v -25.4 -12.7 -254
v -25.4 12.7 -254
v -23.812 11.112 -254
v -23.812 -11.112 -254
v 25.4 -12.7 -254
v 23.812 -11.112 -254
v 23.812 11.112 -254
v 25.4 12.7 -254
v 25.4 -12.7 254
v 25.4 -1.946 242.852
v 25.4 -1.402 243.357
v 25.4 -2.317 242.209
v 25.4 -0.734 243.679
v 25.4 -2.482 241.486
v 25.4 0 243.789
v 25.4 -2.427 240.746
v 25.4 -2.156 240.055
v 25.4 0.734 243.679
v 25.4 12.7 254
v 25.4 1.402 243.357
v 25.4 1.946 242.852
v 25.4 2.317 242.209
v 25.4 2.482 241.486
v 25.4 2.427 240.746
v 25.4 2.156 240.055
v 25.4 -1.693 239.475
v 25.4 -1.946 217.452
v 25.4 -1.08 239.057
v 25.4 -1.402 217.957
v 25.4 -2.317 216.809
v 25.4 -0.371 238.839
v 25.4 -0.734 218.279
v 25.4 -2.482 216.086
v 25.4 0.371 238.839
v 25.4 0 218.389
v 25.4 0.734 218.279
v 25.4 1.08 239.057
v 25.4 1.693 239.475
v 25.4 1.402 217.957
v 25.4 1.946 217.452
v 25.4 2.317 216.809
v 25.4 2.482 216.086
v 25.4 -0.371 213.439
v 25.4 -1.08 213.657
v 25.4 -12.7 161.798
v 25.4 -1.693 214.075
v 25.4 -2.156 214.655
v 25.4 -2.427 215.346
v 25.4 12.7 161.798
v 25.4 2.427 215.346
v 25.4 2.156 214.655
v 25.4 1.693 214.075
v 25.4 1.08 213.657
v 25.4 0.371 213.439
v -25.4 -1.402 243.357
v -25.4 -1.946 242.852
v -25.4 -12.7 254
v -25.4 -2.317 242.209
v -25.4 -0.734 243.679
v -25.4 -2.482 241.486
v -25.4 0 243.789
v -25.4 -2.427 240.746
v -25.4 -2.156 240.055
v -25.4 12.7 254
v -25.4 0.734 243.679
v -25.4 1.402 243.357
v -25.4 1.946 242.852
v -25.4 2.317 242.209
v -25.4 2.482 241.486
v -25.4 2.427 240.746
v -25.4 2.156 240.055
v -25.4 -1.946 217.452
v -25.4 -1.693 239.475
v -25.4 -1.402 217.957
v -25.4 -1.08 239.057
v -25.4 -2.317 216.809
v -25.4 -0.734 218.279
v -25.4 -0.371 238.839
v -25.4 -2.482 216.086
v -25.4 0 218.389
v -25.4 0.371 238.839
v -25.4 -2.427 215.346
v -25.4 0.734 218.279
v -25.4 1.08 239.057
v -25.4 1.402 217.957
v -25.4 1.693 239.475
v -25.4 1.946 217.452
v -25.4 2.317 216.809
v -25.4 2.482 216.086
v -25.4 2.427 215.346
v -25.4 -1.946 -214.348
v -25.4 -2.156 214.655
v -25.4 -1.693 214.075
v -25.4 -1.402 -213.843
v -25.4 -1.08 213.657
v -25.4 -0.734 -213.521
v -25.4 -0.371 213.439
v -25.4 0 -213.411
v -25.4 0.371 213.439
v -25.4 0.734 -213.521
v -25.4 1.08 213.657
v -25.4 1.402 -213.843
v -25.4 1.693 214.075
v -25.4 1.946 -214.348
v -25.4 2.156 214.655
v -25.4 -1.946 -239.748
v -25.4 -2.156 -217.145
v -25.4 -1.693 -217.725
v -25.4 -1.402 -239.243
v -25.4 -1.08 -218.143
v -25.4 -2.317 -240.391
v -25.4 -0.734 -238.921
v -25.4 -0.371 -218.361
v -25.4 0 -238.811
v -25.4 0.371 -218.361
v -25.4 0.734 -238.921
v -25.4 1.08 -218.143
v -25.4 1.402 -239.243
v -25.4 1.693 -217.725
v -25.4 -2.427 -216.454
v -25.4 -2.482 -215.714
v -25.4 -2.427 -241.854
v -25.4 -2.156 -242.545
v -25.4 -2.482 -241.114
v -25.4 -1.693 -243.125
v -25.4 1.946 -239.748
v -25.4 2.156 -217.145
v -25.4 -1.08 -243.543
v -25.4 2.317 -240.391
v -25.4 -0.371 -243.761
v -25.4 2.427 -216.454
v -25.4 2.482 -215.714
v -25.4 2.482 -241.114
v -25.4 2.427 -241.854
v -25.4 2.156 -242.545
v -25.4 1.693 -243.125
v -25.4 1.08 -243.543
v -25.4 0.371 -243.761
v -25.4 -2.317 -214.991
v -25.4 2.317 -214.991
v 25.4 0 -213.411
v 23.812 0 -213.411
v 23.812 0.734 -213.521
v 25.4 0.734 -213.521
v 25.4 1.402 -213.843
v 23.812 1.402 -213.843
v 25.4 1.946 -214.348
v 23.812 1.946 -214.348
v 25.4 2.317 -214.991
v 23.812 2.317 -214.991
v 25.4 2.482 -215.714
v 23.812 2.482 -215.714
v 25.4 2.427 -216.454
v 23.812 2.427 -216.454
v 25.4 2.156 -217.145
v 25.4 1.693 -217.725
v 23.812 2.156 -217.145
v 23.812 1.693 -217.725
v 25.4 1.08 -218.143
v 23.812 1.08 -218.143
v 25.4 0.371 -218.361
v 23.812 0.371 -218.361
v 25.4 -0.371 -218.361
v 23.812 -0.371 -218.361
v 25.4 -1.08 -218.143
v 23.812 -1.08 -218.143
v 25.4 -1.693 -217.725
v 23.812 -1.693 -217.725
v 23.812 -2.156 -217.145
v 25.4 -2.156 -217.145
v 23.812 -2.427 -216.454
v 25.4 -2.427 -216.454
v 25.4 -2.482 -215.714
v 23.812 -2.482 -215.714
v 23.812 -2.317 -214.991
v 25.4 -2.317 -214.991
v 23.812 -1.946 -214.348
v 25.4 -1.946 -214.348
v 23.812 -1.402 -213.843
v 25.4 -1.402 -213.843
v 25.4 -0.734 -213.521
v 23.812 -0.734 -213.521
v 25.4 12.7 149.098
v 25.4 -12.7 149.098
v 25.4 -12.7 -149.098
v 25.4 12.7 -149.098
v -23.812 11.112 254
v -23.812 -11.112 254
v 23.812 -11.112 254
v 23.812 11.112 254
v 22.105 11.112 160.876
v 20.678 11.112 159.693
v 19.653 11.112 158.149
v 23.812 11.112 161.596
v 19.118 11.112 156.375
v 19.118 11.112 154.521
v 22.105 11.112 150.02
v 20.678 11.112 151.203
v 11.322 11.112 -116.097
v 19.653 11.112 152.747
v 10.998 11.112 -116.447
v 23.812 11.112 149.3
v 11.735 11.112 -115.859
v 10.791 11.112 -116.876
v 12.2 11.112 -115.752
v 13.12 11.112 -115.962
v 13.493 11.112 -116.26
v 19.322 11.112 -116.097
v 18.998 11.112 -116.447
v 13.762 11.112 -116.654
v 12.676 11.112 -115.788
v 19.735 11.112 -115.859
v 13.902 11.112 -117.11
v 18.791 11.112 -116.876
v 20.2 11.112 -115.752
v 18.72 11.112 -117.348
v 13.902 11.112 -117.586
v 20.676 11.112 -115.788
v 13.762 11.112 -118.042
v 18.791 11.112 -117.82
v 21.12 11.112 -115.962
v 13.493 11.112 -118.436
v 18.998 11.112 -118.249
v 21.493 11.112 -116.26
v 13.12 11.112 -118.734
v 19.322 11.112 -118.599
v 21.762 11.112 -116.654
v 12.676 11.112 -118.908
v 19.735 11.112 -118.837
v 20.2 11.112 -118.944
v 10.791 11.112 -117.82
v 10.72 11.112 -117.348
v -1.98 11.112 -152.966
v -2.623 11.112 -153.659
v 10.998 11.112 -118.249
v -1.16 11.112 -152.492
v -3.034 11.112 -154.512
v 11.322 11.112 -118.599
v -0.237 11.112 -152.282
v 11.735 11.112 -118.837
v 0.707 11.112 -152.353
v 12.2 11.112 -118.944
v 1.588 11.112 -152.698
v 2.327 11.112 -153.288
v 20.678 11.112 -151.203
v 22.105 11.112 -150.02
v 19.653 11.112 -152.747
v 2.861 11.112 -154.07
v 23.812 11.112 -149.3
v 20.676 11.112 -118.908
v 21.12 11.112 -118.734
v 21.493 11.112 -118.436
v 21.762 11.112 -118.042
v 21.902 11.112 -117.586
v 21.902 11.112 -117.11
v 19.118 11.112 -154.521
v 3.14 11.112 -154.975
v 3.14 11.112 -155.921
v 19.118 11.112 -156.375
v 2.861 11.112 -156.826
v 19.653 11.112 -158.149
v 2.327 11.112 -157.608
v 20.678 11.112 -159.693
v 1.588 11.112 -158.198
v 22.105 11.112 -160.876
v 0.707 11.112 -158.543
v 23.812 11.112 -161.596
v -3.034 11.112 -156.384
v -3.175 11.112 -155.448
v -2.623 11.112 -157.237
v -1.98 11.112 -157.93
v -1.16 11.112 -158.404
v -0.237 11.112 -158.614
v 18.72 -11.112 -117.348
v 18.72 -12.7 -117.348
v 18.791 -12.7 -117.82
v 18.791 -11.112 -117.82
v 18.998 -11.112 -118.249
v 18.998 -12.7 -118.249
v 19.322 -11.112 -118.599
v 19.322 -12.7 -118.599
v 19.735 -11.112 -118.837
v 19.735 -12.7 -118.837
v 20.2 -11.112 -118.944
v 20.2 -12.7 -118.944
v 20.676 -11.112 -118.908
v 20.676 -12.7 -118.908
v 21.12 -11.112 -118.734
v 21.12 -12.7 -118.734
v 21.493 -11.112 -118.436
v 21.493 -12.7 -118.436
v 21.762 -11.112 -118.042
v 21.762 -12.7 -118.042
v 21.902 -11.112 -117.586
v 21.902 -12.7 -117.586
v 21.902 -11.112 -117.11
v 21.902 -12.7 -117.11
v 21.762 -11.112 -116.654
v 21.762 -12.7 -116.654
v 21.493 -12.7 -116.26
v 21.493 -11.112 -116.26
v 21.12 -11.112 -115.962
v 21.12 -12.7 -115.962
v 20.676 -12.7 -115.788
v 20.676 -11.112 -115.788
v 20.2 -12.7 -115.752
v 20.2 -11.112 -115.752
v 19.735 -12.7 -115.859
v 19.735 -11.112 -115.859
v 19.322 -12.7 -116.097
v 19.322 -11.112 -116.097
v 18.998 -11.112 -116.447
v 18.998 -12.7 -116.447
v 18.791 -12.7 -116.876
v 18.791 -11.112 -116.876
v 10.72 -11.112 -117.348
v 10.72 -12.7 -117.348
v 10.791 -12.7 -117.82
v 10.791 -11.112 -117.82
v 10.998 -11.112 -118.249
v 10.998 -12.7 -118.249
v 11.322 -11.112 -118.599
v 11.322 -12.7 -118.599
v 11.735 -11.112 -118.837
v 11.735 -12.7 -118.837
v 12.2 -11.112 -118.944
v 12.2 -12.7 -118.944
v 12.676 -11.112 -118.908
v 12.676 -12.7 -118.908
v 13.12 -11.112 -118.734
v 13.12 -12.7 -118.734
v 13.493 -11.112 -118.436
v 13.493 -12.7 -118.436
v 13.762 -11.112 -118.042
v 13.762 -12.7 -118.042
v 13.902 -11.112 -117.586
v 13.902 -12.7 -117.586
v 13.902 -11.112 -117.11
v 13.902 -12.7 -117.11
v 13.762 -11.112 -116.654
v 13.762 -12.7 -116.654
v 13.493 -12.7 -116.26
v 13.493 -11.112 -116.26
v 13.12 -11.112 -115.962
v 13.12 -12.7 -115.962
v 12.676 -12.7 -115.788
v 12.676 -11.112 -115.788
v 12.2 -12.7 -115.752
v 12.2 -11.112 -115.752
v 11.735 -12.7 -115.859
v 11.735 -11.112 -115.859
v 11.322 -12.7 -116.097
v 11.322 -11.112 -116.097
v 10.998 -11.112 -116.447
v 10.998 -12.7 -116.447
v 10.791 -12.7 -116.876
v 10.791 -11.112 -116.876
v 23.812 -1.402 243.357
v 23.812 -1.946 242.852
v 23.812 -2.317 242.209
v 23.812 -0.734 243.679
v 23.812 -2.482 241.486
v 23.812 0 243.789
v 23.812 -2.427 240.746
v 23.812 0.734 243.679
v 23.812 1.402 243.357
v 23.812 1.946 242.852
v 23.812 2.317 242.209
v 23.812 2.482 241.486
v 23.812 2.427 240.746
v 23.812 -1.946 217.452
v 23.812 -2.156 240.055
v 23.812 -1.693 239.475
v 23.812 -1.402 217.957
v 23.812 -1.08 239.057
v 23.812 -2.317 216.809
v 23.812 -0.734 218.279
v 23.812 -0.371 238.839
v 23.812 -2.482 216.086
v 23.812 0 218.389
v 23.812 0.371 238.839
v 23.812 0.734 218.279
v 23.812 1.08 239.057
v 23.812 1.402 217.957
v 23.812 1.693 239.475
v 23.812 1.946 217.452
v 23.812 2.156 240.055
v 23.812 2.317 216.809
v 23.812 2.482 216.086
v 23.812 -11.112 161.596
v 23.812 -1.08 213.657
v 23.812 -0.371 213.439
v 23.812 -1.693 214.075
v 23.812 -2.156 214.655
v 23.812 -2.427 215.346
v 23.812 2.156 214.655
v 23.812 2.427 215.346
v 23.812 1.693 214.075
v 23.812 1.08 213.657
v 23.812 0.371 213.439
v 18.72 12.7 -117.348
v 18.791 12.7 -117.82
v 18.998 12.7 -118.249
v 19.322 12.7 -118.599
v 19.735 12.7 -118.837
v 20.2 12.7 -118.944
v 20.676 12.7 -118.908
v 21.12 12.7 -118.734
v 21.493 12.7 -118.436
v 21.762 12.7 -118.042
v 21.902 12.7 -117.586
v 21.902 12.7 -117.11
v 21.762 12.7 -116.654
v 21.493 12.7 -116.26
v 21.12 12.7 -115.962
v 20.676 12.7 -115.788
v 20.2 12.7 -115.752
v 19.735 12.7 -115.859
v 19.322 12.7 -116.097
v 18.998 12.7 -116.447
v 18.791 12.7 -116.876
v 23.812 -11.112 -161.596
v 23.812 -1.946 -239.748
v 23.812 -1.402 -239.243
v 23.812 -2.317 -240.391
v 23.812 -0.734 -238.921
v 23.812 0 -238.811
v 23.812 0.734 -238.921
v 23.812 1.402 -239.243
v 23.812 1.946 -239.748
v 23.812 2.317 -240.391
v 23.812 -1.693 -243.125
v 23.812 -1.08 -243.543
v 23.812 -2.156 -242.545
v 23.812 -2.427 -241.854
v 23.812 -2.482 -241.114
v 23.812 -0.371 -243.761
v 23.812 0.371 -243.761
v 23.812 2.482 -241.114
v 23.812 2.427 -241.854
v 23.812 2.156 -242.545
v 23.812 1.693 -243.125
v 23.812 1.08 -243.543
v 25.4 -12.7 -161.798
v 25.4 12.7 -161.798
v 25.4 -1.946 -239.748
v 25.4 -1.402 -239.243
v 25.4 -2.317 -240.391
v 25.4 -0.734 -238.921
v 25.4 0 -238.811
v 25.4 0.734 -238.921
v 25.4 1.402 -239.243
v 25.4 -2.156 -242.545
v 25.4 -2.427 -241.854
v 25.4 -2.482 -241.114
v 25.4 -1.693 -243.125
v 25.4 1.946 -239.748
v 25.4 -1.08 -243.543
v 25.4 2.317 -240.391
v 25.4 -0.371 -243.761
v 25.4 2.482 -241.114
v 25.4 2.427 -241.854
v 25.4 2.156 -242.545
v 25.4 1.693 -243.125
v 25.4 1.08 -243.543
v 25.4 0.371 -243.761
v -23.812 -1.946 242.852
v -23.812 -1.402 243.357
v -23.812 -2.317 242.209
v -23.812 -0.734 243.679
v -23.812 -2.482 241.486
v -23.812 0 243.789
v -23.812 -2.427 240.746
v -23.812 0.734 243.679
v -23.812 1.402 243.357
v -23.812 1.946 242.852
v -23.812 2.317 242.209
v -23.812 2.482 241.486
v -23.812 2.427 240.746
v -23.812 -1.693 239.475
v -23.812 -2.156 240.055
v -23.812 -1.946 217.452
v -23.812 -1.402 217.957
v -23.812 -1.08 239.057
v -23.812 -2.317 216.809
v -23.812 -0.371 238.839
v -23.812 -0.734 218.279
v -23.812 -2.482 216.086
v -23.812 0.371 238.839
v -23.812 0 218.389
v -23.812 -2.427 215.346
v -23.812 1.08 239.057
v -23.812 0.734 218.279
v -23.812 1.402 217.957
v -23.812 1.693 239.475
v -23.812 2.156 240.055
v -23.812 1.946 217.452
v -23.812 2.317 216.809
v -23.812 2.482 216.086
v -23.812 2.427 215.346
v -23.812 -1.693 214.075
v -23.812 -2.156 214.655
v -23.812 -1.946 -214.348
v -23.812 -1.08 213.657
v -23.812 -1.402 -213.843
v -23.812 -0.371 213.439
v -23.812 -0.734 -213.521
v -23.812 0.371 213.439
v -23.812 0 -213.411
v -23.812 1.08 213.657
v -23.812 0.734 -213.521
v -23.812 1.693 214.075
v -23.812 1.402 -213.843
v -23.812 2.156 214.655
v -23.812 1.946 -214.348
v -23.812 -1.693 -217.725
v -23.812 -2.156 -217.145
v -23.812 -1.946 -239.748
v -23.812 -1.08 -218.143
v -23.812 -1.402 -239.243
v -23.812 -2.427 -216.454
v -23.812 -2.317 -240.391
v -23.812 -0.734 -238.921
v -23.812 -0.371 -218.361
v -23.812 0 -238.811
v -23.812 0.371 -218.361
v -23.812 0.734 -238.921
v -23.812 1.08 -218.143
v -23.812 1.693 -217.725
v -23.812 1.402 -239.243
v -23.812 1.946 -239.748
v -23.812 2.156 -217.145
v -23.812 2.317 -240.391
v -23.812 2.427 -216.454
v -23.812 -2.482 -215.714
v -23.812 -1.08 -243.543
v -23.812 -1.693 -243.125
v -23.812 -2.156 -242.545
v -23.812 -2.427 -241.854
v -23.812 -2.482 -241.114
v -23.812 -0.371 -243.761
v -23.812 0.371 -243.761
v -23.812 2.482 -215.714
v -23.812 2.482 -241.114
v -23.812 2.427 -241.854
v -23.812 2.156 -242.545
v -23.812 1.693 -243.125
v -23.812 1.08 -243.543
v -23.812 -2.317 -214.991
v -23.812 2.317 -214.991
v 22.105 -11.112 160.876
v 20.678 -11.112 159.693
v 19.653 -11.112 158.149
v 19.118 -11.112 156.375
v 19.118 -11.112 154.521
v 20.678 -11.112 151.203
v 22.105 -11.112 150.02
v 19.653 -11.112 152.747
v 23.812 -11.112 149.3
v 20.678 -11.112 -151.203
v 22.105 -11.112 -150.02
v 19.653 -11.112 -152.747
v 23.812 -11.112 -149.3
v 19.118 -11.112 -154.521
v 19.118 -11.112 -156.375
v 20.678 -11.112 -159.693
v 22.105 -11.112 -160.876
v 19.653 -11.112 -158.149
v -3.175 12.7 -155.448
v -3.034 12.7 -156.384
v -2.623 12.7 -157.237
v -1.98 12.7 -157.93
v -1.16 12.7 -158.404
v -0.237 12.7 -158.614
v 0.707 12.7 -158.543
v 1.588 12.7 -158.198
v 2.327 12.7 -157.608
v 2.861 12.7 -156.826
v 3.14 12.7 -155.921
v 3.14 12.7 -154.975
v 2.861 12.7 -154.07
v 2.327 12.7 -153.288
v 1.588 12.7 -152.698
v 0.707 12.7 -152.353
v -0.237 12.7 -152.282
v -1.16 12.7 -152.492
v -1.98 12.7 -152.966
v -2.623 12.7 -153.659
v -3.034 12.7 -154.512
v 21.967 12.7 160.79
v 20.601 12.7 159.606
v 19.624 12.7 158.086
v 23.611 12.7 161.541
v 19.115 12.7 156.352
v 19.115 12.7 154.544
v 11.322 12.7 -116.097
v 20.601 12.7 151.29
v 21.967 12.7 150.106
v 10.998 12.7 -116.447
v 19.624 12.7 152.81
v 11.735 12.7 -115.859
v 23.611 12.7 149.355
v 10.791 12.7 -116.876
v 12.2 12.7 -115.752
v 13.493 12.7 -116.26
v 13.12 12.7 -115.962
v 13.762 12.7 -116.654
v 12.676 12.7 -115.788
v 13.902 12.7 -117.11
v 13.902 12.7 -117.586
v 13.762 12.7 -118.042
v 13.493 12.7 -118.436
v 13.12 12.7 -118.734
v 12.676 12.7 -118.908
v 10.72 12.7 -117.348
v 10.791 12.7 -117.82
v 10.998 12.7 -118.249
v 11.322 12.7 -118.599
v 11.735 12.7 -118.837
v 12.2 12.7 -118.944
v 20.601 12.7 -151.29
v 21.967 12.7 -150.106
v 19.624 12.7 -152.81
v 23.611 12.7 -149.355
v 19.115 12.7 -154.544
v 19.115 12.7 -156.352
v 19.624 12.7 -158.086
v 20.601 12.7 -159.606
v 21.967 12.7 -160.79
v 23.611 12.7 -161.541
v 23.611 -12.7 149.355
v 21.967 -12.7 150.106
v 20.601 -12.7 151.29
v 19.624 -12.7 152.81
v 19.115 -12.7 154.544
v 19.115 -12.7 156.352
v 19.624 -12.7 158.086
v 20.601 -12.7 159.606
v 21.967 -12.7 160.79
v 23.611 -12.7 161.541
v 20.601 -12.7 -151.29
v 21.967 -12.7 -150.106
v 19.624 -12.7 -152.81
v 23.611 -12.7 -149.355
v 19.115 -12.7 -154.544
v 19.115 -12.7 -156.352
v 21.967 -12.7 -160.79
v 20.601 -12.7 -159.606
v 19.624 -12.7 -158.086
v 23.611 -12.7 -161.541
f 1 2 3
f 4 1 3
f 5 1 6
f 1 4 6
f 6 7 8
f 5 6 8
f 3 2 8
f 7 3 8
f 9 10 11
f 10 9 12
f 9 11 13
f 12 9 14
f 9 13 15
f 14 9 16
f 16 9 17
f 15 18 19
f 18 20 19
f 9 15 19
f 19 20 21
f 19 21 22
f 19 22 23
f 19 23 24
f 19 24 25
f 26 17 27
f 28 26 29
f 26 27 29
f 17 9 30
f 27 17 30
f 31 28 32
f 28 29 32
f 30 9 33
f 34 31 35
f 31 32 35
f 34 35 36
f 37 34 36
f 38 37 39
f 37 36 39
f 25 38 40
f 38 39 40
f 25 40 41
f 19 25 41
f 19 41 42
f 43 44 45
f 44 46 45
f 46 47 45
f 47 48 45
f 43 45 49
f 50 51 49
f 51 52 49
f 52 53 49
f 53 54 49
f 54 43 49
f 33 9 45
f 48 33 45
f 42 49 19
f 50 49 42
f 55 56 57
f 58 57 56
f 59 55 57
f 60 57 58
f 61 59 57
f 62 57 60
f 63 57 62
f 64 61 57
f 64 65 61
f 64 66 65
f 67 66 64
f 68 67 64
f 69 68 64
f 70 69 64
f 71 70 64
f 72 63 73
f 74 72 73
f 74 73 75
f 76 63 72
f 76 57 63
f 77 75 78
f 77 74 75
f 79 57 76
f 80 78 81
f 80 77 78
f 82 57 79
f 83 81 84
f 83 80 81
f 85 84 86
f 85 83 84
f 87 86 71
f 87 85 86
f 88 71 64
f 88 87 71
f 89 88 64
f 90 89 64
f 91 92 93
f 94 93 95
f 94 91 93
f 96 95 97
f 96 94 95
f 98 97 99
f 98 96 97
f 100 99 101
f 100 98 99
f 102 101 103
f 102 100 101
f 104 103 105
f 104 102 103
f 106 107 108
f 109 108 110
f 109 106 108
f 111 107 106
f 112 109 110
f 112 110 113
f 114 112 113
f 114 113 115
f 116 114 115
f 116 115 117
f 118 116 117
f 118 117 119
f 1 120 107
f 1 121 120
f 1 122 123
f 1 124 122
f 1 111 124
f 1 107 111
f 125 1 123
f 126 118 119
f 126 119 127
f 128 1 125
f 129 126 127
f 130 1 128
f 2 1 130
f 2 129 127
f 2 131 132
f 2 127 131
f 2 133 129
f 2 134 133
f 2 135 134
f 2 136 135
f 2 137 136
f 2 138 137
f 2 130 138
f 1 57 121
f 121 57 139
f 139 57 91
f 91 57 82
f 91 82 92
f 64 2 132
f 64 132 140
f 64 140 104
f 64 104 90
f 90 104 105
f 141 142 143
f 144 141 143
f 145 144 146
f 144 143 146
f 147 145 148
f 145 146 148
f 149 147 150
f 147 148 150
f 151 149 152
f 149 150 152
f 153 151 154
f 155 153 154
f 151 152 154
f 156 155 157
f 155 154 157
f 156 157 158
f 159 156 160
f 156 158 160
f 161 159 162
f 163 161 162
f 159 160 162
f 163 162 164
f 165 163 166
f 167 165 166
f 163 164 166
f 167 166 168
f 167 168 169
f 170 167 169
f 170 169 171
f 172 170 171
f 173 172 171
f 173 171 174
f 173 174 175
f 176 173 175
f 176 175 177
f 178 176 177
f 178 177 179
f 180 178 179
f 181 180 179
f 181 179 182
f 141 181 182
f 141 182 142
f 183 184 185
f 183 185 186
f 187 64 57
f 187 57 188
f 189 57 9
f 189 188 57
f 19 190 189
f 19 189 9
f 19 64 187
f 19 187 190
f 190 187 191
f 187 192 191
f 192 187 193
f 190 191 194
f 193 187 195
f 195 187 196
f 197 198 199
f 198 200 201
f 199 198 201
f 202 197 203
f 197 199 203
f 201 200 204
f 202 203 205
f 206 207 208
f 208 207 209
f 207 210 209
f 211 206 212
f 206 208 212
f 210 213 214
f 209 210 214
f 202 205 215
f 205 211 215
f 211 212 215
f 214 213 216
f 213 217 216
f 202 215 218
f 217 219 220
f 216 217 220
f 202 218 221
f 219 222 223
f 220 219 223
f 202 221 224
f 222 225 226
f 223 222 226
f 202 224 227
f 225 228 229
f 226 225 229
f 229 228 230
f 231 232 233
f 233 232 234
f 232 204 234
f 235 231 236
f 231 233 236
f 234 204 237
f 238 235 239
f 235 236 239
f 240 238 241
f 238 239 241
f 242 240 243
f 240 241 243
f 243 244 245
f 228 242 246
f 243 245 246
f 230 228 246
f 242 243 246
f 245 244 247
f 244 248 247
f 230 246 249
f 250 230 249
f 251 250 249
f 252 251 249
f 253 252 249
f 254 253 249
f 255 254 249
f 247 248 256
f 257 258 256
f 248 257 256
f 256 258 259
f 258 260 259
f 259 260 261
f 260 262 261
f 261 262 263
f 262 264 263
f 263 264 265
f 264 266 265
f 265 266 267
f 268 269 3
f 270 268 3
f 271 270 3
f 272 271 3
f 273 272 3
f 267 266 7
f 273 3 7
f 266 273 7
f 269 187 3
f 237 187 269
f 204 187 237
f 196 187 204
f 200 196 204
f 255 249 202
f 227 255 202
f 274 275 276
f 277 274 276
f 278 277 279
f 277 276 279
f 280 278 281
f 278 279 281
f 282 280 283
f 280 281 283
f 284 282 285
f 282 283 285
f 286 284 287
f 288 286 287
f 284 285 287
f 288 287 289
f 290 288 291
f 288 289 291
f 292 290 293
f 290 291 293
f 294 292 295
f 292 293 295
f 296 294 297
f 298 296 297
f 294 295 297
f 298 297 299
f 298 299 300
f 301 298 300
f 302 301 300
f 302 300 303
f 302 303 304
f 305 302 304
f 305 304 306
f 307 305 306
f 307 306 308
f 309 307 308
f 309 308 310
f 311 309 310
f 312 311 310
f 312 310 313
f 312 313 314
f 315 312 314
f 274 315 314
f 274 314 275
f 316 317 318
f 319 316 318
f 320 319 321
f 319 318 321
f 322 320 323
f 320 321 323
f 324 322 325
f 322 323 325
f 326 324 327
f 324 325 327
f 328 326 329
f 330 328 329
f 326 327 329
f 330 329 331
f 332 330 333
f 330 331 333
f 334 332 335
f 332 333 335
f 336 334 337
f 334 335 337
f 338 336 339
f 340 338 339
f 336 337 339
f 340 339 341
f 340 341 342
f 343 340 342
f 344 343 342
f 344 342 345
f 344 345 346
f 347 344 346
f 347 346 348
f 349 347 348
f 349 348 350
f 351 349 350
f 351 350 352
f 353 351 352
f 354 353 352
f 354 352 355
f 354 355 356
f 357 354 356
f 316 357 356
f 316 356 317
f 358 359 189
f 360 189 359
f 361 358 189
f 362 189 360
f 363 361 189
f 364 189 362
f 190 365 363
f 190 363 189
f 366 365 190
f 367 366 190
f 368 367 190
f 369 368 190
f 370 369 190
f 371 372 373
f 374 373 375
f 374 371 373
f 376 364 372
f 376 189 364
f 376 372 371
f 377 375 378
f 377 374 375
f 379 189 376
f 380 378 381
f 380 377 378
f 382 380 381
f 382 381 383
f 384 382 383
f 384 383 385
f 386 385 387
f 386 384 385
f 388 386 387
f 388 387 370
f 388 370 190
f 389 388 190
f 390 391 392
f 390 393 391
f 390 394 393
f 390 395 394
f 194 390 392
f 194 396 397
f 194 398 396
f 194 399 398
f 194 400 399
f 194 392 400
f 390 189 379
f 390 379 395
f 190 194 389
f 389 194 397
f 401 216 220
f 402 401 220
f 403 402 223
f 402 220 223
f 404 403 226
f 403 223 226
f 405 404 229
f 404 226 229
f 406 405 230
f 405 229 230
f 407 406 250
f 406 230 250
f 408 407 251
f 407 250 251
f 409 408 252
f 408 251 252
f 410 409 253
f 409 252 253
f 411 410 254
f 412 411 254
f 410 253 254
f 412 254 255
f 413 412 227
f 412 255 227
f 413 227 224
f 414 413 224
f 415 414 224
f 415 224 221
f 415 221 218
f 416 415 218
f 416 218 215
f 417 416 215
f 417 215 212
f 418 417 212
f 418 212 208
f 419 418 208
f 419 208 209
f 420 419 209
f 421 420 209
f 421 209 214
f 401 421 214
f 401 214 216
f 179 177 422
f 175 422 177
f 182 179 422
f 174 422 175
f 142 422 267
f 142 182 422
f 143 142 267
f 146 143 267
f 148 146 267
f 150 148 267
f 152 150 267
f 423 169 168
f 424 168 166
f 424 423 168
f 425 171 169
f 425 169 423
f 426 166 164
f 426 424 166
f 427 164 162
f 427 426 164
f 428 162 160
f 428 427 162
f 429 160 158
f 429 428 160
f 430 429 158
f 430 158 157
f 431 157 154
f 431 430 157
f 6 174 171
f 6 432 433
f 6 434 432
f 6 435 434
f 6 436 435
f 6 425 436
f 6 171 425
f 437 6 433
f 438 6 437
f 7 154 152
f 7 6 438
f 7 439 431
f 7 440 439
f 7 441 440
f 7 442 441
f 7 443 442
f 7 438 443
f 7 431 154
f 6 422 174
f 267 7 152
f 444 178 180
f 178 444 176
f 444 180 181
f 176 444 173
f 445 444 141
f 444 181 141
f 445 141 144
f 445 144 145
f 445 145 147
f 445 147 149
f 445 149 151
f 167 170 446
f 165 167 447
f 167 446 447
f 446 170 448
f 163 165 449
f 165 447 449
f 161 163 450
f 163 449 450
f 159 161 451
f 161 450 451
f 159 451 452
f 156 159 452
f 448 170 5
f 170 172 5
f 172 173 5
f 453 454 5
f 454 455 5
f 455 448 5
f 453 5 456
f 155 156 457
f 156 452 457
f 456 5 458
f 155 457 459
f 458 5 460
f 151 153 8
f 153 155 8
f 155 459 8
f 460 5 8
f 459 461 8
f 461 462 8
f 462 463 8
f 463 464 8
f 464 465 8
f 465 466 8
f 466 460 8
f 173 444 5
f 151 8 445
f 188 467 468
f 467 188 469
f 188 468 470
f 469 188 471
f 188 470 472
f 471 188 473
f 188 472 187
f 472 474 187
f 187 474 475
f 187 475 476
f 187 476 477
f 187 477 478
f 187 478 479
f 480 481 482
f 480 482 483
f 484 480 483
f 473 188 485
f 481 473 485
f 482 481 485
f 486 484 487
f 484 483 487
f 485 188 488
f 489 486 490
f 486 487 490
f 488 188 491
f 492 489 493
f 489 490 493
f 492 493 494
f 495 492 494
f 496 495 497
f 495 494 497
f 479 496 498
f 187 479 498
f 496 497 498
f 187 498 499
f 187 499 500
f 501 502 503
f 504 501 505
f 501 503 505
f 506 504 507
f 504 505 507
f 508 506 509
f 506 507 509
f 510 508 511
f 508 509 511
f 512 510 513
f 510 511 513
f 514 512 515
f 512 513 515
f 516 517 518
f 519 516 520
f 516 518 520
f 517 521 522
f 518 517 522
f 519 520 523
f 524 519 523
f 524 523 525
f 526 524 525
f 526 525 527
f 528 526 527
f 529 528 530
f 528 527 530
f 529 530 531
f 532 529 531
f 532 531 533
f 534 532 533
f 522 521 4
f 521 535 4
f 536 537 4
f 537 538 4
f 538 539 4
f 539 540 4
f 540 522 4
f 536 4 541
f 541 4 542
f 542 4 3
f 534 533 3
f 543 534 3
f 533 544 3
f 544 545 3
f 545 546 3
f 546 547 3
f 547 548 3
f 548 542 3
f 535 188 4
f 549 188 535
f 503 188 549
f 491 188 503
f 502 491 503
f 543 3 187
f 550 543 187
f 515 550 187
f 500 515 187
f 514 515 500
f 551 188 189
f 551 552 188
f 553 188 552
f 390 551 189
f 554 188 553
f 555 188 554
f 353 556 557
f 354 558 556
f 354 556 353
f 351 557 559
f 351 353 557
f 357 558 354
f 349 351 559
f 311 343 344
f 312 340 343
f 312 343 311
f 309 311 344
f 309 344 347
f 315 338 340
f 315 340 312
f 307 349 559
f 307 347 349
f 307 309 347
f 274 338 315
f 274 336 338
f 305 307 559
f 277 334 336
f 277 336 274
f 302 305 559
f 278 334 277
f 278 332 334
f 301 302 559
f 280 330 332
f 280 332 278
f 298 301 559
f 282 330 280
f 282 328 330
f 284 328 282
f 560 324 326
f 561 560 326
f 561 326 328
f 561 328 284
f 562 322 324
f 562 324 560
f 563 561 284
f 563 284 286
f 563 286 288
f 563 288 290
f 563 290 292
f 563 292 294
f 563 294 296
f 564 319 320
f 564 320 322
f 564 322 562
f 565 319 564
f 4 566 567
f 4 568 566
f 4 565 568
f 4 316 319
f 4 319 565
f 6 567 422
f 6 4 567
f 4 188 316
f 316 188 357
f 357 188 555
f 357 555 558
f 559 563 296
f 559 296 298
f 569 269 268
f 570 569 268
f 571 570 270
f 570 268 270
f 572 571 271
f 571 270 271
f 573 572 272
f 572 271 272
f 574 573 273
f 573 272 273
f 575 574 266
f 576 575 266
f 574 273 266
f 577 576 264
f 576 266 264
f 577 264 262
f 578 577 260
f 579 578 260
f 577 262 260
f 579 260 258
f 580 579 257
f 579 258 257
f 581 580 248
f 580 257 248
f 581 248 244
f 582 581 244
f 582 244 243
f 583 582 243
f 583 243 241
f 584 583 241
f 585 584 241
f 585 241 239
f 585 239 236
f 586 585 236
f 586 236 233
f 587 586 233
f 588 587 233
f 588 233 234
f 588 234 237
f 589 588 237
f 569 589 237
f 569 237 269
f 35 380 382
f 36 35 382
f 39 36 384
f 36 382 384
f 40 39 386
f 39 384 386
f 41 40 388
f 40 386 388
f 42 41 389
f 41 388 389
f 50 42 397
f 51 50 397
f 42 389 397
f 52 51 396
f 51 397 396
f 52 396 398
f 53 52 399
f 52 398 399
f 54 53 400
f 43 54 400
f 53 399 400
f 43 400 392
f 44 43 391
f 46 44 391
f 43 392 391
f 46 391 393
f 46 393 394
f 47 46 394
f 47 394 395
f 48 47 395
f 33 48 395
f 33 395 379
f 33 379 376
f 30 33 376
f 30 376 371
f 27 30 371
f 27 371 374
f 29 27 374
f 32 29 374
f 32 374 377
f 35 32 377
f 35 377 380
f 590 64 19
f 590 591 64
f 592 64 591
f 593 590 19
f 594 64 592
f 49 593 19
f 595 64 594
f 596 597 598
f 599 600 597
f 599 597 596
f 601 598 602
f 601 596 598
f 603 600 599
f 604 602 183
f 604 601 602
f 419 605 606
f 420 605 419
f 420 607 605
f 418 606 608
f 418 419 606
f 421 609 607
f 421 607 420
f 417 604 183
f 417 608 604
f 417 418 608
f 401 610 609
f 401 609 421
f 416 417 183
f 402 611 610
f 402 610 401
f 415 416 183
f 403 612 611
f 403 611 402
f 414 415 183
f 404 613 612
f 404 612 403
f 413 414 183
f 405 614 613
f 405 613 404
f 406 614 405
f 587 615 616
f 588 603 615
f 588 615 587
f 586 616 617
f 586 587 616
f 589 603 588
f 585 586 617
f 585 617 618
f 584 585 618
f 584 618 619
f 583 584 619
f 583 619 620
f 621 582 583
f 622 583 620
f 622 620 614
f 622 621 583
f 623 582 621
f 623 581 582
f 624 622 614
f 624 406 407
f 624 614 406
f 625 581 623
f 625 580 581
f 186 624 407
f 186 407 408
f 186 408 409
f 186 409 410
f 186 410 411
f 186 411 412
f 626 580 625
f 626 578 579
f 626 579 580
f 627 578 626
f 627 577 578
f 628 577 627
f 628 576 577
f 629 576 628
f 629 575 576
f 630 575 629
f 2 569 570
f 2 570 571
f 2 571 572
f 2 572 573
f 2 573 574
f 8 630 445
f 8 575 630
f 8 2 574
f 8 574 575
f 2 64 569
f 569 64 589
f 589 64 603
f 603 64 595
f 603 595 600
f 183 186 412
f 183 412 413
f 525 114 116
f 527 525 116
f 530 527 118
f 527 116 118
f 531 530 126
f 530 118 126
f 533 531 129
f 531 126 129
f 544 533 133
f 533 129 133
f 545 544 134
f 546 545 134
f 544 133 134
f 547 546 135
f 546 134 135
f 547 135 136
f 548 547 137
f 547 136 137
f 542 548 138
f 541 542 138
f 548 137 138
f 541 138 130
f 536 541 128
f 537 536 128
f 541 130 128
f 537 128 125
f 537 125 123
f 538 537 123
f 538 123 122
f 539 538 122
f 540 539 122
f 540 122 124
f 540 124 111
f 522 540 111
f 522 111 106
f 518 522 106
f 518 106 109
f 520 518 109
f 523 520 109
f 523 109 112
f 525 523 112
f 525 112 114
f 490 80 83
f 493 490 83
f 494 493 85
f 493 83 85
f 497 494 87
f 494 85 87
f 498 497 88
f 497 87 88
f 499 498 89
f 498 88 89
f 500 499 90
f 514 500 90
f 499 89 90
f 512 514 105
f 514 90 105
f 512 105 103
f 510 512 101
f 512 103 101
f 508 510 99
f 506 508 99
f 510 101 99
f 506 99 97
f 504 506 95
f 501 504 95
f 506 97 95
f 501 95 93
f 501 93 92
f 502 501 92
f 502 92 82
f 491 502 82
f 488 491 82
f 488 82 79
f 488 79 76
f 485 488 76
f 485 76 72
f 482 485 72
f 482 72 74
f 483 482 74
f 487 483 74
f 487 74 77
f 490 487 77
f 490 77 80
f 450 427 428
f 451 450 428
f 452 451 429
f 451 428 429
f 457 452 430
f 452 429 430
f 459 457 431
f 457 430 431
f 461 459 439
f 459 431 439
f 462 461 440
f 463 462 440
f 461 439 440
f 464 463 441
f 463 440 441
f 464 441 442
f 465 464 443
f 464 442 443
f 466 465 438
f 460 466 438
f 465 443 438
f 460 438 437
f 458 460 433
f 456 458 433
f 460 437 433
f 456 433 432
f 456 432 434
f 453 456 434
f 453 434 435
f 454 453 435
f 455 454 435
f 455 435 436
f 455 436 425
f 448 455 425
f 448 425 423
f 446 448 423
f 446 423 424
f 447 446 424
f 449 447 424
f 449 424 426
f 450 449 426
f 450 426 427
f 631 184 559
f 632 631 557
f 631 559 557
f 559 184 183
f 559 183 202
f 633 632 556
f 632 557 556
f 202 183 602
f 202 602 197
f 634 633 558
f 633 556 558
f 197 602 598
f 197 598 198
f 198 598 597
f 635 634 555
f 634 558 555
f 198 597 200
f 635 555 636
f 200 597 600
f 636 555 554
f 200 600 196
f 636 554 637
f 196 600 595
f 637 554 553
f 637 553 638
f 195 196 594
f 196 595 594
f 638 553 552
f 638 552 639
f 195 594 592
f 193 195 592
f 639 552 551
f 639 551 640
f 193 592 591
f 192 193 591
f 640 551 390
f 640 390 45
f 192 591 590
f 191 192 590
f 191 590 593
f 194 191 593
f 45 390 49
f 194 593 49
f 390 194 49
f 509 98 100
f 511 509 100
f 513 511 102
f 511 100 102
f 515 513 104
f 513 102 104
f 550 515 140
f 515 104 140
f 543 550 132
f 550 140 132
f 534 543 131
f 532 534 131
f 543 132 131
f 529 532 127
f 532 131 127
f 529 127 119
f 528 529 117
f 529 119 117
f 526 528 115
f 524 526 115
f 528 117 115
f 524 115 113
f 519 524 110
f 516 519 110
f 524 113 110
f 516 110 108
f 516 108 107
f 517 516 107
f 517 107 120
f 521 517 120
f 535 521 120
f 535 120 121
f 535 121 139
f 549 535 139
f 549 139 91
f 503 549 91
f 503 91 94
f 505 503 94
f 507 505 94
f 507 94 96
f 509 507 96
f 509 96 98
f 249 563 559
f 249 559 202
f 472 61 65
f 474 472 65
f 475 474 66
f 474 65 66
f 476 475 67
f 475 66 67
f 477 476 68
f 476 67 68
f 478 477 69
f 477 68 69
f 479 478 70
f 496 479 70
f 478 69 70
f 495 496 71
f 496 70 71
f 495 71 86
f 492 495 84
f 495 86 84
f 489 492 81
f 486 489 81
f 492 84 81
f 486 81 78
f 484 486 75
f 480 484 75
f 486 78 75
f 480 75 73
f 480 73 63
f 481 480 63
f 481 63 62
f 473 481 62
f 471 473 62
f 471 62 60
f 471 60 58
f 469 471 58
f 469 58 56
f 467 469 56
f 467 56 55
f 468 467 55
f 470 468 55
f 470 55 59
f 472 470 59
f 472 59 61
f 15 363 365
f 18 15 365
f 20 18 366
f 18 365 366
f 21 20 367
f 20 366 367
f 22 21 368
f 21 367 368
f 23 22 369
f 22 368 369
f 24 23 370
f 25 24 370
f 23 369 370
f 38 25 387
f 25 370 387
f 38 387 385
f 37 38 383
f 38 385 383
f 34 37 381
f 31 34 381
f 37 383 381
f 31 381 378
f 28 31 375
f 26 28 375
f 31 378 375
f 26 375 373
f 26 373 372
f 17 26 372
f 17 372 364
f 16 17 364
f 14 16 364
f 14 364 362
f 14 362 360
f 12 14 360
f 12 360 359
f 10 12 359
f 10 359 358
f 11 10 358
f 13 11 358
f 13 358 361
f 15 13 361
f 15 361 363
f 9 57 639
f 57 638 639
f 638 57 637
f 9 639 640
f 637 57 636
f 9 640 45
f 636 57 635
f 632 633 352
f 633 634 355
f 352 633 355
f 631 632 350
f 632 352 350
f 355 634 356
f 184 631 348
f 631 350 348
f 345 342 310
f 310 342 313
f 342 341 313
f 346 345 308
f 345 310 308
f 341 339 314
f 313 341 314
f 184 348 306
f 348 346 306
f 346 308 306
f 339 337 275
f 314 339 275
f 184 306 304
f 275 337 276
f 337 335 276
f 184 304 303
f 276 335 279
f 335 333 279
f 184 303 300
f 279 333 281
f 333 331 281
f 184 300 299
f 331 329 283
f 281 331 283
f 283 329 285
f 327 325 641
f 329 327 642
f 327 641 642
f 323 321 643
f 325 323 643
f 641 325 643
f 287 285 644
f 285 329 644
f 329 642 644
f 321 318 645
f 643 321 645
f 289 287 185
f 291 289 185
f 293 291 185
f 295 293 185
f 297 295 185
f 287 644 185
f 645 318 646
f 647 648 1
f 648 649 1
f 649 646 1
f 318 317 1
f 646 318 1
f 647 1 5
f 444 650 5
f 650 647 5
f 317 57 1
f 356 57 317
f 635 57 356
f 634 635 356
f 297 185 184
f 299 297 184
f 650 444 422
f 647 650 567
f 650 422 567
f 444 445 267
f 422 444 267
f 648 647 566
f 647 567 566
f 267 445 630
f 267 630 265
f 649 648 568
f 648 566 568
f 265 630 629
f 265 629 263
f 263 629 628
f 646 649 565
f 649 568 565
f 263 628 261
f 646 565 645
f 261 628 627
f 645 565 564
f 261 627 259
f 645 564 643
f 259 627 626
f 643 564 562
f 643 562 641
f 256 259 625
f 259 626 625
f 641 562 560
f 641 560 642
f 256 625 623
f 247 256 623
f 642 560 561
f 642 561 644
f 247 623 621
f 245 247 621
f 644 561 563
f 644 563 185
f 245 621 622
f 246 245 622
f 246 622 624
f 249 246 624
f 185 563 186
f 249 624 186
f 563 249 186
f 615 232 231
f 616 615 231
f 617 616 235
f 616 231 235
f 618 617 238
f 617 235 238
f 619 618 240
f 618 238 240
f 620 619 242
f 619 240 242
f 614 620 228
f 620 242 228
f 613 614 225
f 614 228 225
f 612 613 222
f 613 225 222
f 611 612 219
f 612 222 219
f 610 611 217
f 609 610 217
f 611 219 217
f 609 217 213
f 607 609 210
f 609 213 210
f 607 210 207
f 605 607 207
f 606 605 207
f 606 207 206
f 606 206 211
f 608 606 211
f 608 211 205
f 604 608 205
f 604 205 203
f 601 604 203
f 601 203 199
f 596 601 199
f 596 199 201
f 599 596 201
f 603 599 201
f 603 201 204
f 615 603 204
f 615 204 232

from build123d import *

# Parameters (mm, degrees)
BOSS_EXTRUDE1_DEPTH             = 254.000001
BOSS_EXTRUDE1_DEPTH_BACK        = 254.000001
SKETCH3_W                       = 50.8
SKETCH3_H                       = 25.4
SKETCH3_W_2                     = 47.625
SKETCH3_H_2                     = 22.225
F_10_CLEARANCE_HOLE1_D          = 4.9784
SKETCH6_R                       = 6.35
CUT_EXTRUDE1_DEPTH              = 257.527426425
F_1_4_0_25_DIAMETER_HOLE1_D     = 6.35
F_1_4_0_25_DIAMETER_HOLE1_DEPTH = 5.08
F_1_4_0_25_DIAMETER_HOLE1_TIP   = 1.907732465
F_3_2_3_2_DIAMETER_HOLE1_D      = 3.2


with BuildPart() as part:
    # Sketch3 → Boss-Extrude1 (new, two sides: drawn at the far end of the back side and taken through both)
    with BuildSketch(Plane.XY.offset(-BOSS_EXTRUDE1_DEPTH_BACK)):
        Rectangle(SKETCH3_W, SKETCH3_H)
        Rectangle(SKETCH3_W_2, SKETCH3_H_2, mode=Mode.SUBTRACT)
    extrude(amount=BOSS_EXTRUDE1_DEPTH + BOSS_EXTRUDE1_DEPTH_BACK)

    # #10 Clearance Hole1 (through all)
    with Locations(Plane(origin=(25.4, 0, 0), x_dir=(0, 0, -1), z_dir=(1, 0, 0))):
        with Locations((-215.900000508, 0), (-241.300000508, 0), (215.899999492, 0), (241.299999492, 0)):
            Hole(F_10_CLEARANCE_HOLE1_D / 2)

    # Sketch6 → Cut-Extrude1 (cut, through all)
    with BuildSketch(Plane(origin=(0, 12.7, 0), x_dir=(1, 0, 0), z_dir=(0, 1, 0))):
        with Locations((25.4, -155.448000508)):
            Circle(SKETCH6_R)
        with Locations((25.4, 155.448000508)):
            Circle(SKETCH6_R)
    extrude(amount=-CUT_EXTRUDE1_DEPTH, mode=Mode.SUBTRACT)

    # 1/4 (0.25) Diameter Hole1
    with Locations(Plane(origin=(0, 12.7, 0), x_dir=(1, 0, 0), z_dir=(0, 1, 0))):
        with Locations((0, 155.448000508)):
            Hole(F_1_4_0_25_DIAMETER_HOLE1_D / 2, depth=F_1_4_0_25_DIAMETER_HOLE1_DEPTH)
            with Locations((0, 0, -(F_1_4_0_25_DIAMETER_HOLE1_DEPTH + F_1_4_0_25_DIAMETER_HOLE1_TIP / 2))):  # 118° drill point
                Cone(0, F_1_4_0_25_DIAMETER_HOLE1_D / 2, F_1_4_0_25_DIAMETER_HOLE1_TIP, mode=Mode.SUBTRACT)

    # Ø3.2 (3.2) Diameter Hole1 (through all)
    with Locations(Plane(origin=(0, 12.7, 0), x_dir=(1, 0, 0), z_dir=(0, 1, 0))):
        with Locations((20.32, 117.348000508), (12.32, 117.348000508)):
            Hole(F_3_2_3_2_DIAMETER_HOLE1_D / 2)


solid = part.part
